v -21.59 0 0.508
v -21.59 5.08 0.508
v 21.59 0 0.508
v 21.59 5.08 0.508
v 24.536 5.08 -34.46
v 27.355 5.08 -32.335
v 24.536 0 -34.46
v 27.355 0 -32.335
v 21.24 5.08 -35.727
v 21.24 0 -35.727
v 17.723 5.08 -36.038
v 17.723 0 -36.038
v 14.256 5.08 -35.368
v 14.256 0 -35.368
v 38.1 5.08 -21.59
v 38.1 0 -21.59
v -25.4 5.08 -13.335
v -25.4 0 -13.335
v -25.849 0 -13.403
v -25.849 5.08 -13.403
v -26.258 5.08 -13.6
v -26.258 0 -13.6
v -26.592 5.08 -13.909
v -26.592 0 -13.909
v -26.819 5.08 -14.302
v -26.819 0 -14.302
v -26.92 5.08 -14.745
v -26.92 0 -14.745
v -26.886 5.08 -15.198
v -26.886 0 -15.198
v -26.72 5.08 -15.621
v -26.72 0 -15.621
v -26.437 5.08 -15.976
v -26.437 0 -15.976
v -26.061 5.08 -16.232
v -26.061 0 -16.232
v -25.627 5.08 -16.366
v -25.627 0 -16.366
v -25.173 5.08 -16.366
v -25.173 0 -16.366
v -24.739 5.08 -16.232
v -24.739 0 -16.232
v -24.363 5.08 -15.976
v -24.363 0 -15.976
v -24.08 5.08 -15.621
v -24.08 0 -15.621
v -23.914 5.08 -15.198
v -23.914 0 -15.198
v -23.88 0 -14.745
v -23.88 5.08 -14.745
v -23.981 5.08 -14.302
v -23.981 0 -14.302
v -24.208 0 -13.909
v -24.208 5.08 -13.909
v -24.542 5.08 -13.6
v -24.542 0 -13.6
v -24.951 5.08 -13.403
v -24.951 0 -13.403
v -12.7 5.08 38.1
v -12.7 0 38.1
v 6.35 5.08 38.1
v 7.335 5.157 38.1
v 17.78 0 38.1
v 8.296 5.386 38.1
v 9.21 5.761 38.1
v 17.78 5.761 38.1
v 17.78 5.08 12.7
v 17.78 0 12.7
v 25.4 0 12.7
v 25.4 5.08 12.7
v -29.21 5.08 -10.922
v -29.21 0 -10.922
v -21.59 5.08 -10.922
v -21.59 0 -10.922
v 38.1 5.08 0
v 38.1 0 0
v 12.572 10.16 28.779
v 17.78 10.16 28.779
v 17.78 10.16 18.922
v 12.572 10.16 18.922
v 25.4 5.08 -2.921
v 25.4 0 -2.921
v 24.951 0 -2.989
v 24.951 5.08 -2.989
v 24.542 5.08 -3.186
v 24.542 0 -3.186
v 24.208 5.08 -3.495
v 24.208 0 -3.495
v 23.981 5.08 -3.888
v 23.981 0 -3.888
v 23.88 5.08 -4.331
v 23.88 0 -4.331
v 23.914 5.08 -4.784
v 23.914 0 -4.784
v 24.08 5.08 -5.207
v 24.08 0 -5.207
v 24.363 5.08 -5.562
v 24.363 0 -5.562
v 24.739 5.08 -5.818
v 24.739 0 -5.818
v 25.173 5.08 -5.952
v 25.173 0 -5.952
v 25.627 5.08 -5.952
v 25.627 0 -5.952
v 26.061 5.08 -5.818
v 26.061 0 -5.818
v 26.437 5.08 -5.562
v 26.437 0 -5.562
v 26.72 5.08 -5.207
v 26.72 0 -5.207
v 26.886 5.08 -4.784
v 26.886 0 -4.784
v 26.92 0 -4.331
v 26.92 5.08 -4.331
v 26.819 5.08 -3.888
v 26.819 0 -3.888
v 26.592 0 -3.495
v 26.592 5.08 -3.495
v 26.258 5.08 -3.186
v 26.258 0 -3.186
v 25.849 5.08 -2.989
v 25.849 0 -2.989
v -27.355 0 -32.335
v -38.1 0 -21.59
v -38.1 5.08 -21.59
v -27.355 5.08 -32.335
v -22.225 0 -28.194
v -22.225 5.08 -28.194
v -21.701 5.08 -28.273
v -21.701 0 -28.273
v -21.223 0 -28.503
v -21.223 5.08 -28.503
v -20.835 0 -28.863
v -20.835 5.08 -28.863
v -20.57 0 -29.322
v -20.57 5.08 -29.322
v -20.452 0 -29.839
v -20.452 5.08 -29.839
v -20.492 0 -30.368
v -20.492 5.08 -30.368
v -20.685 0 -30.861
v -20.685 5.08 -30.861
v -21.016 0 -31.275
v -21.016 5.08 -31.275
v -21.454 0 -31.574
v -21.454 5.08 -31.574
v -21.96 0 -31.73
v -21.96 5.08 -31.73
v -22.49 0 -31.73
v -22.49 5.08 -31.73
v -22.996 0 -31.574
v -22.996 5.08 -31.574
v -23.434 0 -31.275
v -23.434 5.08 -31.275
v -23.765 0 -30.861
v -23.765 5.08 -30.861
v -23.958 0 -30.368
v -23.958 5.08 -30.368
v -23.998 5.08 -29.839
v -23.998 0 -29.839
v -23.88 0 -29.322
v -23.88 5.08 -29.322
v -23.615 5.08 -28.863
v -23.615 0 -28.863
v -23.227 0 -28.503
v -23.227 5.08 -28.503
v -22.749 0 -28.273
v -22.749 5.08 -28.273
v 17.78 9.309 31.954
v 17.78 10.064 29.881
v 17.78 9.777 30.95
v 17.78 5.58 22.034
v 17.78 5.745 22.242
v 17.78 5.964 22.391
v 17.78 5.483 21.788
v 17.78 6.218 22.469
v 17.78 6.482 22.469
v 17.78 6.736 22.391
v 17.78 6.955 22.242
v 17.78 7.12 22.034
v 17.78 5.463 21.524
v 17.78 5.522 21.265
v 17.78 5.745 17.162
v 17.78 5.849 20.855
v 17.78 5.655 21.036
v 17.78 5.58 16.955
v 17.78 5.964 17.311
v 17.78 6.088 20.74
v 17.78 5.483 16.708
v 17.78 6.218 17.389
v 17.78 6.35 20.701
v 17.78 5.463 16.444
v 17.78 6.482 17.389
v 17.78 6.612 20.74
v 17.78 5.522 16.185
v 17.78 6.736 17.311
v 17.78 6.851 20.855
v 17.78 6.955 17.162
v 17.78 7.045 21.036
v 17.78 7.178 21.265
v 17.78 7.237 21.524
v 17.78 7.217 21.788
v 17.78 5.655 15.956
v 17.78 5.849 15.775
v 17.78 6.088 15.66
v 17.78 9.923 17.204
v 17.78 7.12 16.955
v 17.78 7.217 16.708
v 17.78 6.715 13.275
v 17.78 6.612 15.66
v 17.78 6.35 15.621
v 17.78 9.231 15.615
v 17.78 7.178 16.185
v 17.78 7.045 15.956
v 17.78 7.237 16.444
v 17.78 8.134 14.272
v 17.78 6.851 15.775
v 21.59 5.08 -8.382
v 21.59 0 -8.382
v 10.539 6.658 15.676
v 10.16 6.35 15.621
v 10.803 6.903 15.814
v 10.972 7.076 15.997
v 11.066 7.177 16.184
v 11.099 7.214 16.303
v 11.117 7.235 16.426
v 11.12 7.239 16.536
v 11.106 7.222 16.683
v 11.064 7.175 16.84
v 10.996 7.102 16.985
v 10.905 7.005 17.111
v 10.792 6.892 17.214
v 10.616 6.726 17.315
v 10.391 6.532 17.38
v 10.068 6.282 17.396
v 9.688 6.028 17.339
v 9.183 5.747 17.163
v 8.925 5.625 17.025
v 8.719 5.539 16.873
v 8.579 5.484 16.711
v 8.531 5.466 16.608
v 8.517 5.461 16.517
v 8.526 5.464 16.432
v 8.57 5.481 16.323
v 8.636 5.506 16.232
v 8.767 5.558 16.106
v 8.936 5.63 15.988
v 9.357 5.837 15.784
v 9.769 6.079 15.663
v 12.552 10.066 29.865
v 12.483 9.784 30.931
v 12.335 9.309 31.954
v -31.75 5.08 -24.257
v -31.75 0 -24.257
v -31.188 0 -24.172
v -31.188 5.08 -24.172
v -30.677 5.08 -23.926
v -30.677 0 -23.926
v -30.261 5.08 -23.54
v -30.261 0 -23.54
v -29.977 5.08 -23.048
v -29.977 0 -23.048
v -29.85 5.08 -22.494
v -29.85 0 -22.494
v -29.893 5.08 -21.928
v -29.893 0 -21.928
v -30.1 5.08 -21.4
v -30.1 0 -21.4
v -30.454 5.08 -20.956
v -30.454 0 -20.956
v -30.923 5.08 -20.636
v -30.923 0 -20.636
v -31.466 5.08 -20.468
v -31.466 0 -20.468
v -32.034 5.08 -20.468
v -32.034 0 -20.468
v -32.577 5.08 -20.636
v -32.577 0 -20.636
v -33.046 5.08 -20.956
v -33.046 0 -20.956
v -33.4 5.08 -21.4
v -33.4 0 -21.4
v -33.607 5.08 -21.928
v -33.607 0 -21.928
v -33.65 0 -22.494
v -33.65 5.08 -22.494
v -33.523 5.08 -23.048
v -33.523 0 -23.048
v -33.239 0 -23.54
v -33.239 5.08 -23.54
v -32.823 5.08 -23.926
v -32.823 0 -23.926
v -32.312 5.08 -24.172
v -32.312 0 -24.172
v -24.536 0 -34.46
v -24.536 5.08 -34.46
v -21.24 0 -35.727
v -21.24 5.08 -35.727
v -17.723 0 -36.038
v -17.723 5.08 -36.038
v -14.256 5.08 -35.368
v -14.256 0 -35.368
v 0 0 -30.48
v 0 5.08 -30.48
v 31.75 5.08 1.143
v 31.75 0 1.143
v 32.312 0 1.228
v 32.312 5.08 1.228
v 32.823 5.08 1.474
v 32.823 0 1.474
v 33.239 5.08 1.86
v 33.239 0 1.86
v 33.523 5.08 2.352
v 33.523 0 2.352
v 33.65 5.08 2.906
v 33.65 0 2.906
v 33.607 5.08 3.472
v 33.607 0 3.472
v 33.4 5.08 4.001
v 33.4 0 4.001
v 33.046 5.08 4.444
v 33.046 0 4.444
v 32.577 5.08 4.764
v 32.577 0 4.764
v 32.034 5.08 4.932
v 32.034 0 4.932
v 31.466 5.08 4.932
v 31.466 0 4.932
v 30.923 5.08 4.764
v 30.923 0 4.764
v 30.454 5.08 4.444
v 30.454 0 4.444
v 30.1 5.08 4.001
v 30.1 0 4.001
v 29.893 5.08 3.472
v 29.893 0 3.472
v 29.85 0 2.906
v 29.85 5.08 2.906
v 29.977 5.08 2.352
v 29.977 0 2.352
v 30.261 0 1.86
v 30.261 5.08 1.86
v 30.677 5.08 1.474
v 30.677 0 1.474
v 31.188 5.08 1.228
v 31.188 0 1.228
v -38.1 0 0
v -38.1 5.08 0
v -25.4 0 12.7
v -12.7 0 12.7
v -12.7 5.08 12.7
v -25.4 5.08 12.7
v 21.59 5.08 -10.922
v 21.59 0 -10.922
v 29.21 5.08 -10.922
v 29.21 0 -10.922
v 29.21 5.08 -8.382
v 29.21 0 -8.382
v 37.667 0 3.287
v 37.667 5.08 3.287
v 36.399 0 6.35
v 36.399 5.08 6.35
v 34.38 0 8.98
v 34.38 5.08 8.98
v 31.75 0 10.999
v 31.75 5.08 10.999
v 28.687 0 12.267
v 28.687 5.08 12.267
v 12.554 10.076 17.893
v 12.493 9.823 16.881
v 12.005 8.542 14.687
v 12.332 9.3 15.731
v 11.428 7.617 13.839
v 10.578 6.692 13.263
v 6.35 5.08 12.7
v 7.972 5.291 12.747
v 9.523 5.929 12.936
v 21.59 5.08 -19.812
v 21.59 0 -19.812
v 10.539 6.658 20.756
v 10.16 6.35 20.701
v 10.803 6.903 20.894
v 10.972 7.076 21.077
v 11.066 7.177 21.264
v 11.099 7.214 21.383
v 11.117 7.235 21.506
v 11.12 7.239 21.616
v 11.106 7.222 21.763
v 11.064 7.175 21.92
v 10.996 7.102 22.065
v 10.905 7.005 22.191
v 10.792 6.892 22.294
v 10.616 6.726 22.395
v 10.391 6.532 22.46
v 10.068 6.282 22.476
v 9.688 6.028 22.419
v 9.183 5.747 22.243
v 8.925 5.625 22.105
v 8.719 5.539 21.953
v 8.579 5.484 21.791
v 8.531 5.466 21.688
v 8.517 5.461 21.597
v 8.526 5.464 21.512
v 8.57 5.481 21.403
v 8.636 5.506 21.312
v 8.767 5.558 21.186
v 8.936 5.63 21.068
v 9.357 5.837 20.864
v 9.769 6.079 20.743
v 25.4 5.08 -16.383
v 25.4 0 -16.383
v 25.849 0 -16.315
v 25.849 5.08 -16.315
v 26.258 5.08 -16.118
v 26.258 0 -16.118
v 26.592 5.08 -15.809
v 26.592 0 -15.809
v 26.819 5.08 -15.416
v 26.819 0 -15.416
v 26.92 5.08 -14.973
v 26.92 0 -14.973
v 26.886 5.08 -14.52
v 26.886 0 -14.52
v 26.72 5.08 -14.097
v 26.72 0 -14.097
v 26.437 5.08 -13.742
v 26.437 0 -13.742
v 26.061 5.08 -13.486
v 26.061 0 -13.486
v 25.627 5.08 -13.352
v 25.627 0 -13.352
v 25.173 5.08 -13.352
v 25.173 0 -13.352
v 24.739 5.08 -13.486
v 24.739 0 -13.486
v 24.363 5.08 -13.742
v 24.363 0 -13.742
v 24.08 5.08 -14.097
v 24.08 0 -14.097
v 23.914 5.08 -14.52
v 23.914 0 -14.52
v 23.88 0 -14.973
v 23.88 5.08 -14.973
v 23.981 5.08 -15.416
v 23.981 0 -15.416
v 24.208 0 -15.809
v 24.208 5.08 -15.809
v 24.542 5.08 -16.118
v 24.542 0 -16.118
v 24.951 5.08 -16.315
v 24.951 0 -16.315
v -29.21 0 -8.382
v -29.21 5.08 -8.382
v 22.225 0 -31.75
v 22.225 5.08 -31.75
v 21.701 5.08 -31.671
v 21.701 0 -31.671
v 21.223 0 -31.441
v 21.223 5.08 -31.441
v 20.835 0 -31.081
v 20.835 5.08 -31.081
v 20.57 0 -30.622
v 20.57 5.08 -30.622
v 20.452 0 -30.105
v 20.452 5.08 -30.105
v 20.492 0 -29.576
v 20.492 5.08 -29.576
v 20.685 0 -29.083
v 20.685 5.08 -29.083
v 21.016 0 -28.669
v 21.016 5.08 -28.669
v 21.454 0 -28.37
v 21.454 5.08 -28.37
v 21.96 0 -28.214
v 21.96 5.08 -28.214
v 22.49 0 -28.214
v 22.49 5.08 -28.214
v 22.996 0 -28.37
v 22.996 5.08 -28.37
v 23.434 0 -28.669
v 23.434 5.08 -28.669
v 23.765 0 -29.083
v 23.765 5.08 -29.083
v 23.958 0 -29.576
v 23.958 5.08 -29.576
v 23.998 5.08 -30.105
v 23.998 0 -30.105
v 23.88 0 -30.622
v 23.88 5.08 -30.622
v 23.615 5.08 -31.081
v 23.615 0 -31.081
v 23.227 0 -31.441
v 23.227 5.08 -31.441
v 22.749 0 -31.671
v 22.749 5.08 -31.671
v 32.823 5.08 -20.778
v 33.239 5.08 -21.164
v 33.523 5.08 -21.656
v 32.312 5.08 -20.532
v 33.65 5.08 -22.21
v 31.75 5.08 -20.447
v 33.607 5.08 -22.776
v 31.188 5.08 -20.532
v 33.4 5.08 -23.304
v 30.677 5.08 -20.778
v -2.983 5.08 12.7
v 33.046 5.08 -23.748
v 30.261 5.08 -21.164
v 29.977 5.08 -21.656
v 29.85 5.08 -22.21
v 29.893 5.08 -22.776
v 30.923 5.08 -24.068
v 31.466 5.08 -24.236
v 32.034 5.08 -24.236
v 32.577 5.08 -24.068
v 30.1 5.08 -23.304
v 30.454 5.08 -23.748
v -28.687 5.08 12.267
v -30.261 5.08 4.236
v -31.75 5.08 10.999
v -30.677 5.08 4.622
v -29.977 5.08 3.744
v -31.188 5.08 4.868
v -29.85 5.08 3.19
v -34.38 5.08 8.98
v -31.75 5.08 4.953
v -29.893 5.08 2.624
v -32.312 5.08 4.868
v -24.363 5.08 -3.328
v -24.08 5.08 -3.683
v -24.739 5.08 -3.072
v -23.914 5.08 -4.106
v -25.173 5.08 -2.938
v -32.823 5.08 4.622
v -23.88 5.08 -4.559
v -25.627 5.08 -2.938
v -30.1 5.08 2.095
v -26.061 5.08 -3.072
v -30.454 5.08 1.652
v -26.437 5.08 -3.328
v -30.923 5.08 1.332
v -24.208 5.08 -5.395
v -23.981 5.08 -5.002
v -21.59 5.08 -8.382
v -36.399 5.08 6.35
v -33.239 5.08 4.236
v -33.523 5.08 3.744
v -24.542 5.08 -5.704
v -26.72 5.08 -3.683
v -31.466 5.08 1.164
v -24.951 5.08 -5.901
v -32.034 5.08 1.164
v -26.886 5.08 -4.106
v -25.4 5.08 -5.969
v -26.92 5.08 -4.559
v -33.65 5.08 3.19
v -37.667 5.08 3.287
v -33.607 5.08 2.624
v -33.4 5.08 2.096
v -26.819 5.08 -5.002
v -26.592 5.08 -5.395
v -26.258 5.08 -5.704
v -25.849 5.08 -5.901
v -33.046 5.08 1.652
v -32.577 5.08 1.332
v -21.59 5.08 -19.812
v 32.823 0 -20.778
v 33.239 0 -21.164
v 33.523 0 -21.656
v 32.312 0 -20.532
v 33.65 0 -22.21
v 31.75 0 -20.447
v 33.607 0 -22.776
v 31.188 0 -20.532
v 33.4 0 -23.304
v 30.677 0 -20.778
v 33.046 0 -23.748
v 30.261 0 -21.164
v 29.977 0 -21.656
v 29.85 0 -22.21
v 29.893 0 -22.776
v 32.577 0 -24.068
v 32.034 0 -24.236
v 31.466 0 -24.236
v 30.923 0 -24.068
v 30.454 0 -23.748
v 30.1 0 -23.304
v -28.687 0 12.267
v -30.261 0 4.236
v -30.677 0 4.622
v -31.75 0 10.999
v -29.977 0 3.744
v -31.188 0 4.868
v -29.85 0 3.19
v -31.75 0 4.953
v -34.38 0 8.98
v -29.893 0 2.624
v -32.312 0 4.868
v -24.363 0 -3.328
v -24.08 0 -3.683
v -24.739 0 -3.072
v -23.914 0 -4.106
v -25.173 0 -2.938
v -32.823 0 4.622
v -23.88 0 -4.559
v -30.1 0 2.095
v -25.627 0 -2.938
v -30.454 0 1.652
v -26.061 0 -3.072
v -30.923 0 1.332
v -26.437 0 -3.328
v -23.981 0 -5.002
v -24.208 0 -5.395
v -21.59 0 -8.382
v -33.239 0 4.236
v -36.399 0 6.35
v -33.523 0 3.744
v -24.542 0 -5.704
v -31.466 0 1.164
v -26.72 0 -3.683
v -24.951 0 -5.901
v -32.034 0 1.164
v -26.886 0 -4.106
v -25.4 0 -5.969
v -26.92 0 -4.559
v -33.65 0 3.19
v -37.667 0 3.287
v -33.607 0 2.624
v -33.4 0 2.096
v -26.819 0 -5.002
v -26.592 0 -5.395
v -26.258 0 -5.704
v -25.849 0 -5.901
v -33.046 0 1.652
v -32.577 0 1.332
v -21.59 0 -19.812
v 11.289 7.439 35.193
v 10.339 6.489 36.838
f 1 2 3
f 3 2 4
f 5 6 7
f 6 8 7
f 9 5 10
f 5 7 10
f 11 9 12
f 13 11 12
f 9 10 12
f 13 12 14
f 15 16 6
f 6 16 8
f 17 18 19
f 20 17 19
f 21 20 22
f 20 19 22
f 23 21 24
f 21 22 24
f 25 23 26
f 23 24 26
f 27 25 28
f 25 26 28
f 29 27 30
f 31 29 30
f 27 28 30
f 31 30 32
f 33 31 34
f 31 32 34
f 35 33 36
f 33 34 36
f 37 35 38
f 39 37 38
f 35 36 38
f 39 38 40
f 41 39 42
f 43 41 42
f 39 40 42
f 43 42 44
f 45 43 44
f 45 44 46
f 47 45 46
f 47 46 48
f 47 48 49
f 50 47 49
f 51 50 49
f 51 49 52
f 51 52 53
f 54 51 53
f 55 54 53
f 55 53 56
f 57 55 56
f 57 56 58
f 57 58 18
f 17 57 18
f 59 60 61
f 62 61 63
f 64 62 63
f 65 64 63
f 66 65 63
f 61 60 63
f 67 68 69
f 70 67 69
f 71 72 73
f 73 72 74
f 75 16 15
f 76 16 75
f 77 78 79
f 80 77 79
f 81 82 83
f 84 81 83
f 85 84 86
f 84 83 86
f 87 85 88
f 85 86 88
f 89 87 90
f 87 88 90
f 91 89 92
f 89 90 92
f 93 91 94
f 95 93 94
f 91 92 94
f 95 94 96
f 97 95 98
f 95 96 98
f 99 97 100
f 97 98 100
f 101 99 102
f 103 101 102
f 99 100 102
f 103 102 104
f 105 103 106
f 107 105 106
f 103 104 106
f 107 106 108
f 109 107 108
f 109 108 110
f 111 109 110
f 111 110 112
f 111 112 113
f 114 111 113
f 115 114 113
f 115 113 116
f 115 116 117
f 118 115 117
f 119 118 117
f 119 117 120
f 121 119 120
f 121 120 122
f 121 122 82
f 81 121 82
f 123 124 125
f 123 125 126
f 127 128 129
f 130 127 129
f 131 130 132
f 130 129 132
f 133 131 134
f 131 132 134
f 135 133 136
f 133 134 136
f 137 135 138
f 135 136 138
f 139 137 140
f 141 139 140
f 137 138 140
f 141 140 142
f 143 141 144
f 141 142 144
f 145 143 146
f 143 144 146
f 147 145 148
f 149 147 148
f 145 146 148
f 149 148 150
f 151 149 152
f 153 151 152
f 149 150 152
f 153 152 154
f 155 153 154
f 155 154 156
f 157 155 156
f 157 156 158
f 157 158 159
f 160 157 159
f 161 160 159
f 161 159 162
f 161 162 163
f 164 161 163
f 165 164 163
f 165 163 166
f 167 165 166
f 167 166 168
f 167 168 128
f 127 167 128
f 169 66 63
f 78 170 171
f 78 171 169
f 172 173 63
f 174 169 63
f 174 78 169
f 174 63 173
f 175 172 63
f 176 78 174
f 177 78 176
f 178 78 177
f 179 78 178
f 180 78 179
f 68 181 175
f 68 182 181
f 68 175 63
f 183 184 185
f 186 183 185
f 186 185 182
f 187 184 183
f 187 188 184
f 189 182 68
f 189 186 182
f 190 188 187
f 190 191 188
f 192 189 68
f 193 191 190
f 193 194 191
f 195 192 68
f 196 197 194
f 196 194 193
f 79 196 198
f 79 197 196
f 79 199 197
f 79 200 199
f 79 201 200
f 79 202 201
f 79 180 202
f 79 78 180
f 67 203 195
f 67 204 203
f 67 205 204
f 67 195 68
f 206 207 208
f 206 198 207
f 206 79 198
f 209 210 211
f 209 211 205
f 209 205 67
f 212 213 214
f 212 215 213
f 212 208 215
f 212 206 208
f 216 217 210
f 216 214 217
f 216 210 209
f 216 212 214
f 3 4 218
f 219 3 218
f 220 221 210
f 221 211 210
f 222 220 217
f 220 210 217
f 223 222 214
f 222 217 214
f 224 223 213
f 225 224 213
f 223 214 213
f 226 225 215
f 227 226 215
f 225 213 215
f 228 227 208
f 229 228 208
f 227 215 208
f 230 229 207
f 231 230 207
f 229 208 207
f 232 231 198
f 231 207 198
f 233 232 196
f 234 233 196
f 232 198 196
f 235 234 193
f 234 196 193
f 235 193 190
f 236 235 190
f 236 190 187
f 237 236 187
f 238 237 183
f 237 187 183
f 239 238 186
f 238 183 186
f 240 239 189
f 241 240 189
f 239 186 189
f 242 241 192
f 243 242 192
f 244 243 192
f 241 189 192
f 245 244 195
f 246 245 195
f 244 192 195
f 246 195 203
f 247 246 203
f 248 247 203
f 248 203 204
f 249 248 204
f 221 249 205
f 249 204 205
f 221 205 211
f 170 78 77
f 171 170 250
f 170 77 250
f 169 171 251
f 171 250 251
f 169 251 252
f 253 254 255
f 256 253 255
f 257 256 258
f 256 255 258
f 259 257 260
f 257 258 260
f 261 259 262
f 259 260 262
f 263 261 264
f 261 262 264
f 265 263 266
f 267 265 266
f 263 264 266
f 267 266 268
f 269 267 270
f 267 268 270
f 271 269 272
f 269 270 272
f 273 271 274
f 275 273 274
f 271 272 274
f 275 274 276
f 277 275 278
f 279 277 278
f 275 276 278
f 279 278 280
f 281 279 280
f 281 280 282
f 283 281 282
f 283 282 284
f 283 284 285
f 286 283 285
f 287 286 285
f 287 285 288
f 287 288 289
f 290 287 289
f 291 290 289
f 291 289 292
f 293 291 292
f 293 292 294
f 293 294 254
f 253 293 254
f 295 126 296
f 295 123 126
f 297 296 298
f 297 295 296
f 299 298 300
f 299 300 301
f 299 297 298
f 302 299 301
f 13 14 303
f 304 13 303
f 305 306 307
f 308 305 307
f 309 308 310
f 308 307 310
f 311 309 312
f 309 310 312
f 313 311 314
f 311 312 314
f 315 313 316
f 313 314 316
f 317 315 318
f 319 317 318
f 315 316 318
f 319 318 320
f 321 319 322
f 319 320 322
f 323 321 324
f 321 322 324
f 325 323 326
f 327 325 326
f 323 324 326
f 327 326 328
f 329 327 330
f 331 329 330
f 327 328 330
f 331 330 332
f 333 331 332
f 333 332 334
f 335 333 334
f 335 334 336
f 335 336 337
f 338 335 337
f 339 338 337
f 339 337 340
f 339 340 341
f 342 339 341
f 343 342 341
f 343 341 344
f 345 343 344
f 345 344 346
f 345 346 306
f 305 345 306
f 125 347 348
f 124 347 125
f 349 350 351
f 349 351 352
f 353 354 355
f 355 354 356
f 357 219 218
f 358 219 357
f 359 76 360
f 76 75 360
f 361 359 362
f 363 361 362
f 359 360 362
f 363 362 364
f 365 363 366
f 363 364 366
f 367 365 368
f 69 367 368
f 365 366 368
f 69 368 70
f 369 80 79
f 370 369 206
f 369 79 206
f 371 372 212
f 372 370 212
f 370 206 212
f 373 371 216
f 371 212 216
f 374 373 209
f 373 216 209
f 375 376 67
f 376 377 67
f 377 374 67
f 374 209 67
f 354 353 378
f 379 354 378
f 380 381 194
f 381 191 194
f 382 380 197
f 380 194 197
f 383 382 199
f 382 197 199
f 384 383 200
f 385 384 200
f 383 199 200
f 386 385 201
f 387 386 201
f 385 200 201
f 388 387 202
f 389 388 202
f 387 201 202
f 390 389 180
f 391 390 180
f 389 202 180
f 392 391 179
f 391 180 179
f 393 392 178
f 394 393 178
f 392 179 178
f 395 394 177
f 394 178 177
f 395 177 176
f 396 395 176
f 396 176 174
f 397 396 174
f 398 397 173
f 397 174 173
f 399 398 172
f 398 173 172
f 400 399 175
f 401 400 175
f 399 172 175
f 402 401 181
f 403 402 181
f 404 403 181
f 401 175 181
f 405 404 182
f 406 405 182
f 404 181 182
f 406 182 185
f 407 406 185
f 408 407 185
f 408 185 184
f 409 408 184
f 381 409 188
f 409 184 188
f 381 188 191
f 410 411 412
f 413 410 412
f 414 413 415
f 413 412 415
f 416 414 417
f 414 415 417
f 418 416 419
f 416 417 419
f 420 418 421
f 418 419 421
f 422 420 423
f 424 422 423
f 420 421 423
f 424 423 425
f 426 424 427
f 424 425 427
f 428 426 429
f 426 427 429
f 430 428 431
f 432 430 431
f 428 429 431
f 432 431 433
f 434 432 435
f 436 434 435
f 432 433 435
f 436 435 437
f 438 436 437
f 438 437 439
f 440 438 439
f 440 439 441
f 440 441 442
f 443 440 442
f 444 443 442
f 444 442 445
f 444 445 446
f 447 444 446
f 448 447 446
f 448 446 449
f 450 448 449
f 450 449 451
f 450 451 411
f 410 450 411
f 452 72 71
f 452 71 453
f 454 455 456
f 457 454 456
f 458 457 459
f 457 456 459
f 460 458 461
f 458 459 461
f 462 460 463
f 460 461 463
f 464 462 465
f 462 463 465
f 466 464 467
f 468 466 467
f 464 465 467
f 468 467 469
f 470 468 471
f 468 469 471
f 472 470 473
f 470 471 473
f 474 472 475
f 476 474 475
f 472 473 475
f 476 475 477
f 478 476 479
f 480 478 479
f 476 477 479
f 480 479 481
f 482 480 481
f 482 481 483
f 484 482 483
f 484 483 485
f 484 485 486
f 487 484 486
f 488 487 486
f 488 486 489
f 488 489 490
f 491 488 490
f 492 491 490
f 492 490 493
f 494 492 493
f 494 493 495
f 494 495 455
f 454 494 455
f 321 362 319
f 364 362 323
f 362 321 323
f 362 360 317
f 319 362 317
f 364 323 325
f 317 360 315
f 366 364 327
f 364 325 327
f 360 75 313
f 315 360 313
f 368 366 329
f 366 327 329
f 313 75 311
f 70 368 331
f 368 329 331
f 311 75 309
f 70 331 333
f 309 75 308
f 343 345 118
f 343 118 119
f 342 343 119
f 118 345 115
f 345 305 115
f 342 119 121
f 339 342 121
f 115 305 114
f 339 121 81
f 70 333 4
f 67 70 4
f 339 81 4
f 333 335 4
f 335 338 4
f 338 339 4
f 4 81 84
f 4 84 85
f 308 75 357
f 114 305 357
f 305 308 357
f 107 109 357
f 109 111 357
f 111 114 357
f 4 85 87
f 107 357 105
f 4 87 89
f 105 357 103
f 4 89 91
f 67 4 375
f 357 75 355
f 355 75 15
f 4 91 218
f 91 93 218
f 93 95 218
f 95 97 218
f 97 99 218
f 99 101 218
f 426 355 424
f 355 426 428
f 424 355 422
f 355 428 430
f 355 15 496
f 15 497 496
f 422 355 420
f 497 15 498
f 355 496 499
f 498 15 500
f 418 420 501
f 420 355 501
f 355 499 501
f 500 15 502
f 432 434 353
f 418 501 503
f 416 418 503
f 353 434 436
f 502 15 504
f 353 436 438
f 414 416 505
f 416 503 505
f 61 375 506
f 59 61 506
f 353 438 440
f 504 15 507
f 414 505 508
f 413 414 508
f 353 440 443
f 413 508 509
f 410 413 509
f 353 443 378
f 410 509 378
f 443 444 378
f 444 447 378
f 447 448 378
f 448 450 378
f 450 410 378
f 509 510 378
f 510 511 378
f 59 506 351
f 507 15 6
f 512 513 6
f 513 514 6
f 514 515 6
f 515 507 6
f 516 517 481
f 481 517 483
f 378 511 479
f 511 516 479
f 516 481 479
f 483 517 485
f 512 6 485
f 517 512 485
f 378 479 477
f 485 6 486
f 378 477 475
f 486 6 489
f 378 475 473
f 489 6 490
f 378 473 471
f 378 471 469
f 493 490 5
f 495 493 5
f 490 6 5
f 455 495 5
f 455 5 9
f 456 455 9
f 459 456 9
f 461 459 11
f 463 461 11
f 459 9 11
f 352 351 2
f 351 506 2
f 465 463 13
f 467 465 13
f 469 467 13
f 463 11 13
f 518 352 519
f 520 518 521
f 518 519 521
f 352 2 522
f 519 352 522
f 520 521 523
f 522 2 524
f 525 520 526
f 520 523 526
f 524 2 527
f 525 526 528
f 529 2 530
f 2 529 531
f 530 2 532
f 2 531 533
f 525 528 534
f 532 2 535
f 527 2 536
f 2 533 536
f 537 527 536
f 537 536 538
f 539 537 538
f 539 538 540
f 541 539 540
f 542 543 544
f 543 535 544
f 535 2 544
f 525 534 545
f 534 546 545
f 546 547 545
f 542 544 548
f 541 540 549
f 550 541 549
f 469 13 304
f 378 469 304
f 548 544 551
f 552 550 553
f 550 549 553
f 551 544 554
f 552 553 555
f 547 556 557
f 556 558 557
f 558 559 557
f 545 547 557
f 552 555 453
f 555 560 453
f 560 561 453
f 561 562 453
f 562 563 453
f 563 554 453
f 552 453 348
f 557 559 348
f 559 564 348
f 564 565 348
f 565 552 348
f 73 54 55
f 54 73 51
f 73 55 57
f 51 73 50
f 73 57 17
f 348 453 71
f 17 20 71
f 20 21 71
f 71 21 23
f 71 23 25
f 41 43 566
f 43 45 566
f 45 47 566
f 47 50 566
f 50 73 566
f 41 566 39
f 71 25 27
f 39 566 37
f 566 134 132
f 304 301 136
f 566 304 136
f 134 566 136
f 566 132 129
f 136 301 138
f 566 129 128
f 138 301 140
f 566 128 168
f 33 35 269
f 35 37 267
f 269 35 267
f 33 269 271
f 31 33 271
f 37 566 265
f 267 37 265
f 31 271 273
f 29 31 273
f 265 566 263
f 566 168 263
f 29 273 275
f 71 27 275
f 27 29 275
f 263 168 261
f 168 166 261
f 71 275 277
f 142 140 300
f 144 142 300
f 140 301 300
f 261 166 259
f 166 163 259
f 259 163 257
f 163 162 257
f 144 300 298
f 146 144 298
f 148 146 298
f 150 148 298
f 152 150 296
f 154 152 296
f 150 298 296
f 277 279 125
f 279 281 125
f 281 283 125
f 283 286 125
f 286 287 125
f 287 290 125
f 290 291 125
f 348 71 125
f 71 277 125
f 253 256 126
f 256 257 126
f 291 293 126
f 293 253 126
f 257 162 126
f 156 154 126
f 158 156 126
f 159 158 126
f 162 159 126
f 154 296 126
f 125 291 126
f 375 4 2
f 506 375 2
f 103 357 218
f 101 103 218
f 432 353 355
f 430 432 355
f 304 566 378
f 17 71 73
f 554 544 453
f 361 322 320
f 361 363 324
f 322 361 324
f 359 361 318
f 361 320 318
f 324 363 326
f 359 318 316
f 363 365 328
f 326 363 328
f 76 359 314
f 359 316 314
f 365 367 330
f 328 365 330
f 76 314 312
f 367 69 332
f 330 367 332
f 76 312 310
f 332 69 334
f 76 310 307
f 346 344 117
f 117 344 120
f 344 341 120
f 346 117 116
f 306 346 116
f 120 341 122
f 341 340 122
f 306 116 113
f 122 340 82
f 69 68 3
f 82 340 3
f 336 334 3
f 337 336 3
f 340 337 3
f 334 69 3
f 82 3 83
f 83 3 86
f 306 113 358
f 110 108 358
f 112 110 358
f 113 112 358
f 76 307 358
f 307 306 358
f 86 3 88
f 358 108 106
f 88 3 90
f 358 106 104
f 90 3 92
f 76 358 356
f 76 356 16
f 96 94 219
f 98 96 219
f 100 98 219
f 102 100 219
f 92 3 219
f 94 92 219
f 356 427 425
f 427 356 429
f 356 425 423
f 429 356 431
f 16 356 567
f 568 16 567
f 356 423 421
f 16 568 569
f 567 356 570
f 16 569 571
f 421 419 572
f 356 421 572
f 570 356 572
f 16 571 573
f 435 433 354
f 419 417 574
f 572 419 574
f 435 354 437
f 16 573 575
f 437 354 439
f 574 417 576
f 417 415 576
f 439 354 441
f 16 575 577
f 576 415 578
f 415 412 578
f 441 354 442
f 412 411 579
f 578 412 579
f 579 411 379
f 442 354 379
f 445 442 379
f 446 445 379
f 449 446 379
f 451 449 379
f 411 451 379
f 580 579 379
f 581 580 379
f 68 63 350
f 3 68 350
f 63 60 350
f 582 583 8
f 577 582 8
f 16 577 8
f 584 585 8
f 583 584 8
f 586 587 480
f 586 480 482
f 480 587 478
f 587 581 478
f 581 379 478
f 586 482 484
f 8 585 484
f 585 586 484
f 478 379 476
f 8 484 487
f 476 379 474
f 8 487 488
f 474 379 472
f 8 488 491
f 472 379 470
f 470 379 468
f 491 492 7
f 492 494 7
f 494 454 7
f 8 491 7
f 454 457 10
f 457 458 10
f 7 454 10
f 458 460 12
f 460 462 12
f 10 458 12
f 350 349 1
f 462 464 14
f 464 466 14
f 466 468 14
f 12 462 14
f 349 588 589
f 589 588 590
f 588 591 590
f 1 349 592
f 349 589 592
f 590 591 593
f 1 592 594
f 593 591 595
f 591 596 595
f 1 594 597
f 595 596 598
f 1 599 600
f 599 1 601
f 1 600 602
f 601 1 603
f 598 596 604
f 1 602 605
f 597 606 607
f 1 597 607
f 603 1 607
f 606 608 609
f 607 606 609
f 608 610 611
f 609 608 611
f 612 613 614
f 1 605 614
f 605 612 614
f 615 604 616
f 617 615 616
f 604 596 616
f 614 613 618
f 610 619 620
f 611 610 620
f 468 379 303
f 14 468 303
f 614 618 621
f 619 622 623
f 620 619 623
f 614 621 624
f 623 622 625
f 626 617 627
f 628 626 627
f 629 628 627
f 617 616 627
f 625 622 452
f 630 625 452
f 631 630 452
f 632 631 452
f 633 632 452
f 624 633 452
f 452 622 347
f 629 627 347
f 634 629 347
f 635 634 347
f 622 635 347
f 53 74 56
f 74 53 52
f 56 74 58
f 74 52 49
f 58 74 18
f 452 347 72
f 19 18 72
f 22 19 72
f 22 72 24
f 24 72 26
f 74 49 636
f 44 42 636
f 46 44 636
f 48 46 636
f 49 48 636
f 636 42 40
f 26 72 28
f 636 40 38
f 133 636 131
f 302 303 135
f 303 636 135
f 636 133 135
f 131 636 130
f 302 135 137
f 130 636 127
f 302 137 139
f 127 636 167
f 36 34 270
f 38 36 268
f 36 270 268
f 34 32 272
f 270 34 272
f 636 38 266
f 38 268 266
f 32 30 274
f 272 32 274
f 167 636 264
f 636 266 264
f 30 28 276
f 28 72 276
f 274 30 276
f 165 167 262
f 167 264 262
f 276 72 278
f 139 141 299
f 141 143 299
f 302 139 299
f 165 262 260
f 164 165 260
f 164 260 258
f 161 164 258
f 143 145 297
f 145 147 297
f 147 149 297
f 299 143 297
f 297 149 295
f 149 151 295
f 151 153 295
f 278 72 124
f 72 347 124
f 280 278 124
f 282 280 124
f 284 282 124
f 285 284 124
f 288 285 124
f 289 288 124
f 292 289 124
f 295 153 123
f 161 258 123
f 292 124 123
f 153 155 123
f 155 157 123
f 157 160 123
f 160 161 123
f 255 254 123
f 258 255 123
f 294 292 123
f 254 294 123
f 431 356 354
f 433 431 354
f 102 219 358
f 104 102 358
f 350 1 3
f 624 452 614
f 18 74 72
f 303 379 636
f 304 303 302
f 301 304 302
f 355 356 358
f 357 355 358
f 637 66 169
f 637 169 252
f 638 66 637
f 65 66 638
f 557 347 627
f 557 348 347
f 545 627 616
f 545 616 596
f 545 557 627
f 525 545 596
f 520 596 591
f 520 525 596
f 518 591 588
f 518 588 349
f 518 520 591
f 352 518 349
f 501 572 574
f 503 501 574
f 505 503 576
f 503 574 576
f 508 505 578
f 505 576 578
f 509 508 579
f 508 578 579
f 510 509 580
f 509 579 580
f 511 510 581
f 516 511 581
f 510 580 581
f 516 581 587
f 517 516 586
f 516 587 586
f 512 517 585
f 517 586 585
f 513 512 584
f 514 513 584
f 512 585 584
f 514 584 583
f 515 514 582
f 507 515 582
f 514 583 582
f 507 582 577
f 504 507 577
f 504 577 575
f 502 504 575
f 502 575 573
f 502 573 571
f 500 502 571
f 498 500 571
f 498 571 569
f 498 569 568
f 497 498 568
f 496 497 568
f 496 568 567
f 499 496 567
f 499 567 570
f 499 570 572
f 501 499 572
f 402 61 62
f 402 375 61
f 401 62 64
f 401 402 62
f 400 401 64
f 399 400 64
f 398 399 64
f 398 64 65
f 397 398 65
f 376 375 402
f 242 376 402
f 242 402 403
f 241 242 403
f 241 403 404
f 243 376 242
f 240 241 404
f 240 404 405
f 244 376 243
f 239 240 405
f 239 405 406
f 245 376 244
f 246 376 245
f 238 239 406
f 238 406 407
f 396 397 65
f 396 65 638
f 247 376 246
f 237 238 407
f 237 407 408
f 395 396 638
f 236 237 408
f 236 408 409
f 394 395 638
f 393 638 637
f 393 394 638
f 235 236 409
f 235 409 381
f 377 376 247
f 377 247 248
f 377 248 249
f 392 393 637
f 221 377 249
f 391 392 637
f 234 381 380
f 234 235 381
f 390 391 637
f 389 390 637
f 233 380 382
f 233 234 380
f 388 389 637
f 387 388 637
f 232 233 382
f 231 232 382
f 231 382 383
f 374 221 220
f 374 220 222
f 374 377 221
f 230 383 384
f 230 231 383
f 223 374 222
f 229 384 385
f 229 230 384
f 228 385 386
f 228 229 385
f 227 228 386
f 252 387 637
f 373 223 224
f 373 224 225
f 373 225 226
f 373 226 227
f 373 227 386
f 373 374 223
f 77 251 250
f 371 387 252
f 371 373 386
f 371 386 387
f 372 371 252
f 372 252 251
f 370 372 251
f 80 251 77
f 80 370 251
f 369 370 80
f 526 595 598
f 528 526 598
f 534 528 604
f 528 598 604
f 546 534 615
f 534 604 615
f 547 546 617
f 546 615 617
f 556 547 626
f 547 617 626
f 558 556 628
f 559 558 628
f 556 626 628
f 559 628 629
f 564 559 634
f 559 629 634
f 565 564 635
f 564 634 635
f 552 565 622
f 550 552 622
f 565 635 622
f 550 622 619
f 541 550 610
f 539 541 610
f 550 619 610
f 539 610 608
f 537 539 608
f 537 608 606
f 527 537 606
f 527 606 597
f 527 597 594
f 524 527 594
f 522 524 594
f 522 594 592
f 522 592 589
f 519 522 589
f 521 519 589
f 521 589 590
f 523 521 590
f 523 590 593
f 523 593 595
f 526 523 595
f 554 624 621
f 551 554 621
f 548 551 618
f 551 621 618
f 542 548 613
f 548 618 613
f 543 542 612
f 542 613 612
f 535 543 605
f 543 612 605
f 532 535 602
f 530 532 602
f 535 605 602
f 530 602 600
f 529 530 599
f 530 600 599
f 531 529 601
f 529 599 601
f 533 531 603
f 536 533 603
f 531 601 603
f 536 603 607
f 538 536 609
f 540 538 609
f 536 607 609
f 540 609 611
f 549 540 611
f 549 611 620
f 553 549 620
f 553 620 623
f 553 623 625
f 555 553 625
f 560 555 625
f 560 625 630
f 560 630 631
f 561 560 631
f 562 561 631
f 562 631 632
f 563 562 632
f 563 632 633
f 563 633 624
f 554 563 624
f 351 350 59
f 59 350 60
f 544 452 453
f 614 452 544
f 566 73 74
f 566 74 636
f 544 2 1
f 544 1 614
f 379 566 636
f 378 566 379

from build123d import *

# Parameters (mm, degrees)
BOSS_EXTRUDE1_DEPTH = 5.08
SKETCH2_R           = 1.778
CUT_EXTRUDE1_DEPTH  = 55.120480412
SKETCH3_W           = 43.18
SKETCH3_H           = 20.32
CUT_EXTRUDE2_DEPTH  = 55.120480412
SKETCH10_R          = 1.524
CUT_EXTRUDE3_DEPTH  = 55.120480412
SKETCH11_W          = 7.62
SKETCH11_H          = 2.54
CUT_EXTRUDE4_DEPTH  = 55.120480412
CUT_EXTRUDE5_DEPTH  = 55.120480412
SKETCH14_R          = 1.905
CUT_EXTRUDE6_DEPTH  = 55.120480412
CHAMFER1_SIZE       = 16.51
CHAMFER3_SIZE       = 16.51
FILLET1_R           = 12.7
FILLET2_R           = 12.7
SKETCH15_W          = 6.35
SKETCH15_H          = 25.4
CUT_EXTRUDE7_DEPTH  = 55.120480412
SKETCH18_W          = 25.4
SKETCH18_H          = 12.7
BOSS_EXTRUDE3_DEPTH = 5.08
SKETCH19_R          = 0.889
CUT_EXTRUDE9_DEPTH  = 69.814783295
FILLET4_R           = 6.35
SKETCH20_W          = 25.4
SKETCH20_H          = 2.54
CUT_EXTRUDE10_DEPTH = 69.814783351
CHAMFER4_SIZE       = 7.62
CHAMFER4_SIZE2      = 4.399409051
FILLET5_R           = 6.35
FILLET6_R           = 6.35


with BuildPart() as part:
    # Sketch1 → Boss-Extrude1 (new body)
    with BuildSketch(Plane(origin=(0, 0, 0), x_dir=(1, 0, 0), z_dir=(0, 1, 0))):
        Polygon((-38.1, -12.7), (-38.1, 38.1), (38.1, 38.1), (38.1, -12.7), (19.05, -12.7), (19.05, -38.1), (-19.05, -38.1), (-19.05, -12.7), align=None)
    extrude(amount=BOSS_EXTRUDE1_DEPTH)

    # Sketch2 → Cut-Extrude1 (cut, through all)
    with BuildSketch(Plane(origin=(0, 5.08, 0), x_dir=(1, 0, 0), z_dir=(0, 1, 0))):
        with Locations(Location((-22.225, 29.972, 0), (0, 0, 270))):
            Circle(SKETCH2_R)
        with Locations(Location((22.225, 29.972, 0), (0, 0, 90))):
            Circle(SKETCH2_R)
    extrude(amount=-CUT_EXTRUDE1_DEPTH, mode=Mode.SUBTRACT)

    # Sketch3 → Cut-Extrude2 (cut, through all)
    with BuildSketch(Plane(origin=(0, 5.08, 0), x_dir=(1, 0, 0), z_dir=(0, 1, 0))):
        with Locations((0, 9.652)):
            Rectangle(SKETCH3_W, SKETCH3_H)
    extrude(amount=-CUT_EXTRUDE2_DEPTH, mode=Mode.SUBTRACT)

    # Sketch10 → Cut-Extrude3 (cut, through all)
    with BuildSketch(Plane.XZ):
        with Locations(Location((25.4, -14.859, 0), (0, 0, 270))):
            Circle(SKETCH10_R)
        with Locations(Location((25.4, -4.445, 0), (0, 0, 90))):
            Circle(SKETCH10_R)
        with Locations(Location((-25.4, -14.859, 0), (0, 0, 90))):
            Circle(SKETCH10_R)
        with Locations(Location((-25.4, -4.445, 0), (0, 0, 270))):
            Circle(SKETCH10_R)
    extrude(amount=-CUT_EXTRUDE3_DEPTH, mode=Mode.SUBTRACT)

    # Sketch11 → Cut-Extrude4 (cut, through all)
    with BuildSketch(Plane.XZ):
        with Locations((25.4, -9.652)):
            Rectangle(SKETCH11_W, SKETCH11_H)
        with Locations((-25.4, -9.652)):
            Rectangle(SKETCH11_W, SKETCH11_H)
    extrude(amount=-CUT_EXTRUDE4_DEPTH, mode=Mode.SUBTRACT)

    # Sketch12 → Cut-Extrude5 (cut, through all)
    with BuildSketch(Plane.XZ):
        Polygon((22.225, -38.1), (0, -30.48), (-22.225, -38.1), align=None)
    extrude(amount=-CUT_EXTRUDE5_DEPTH, mode=Mode.SUBTRACT)

    # Sketch14 → Cut-Extrude6 (cut, through all)
    with BuildSketch(Plane.XZ):
        with Locations(Location((31.75, 3.048, 0), (0, 0, 270))):
            Circle(SKETCH14_R)
        with Locations(Location((31.75, -22.352, 0), (0, 0, 90))):
            Circle(SKETCH14_R)
        with Locations(Location((-31.75, 3.048, 0), (0, 0, 90))):
            Circle(SKETCH14_R)
        with Locations(Location((-31.75, -22.352, 0), (0, 0, 270))):
            Circle(SKETCH14_R)
    extrude(amount=-CUT_EXTRUDE6_DEPTH, mode=Mode.SUBTRACT)

    # Chamfer1
    # the kernel refuses this chamfer: 16.51 mm, written as the material it takes off along each edge
    with BuildSketch(Plane(origin=(38.1, -42.458486131, -38.1), x_dir=(0.027495876610586233, 0, 0.9996219169112966), z_dir=(0, 1, 0))) as chamfer1_piece_1:
        Polygon((CHAMFER1_SIZE * 0.999621916911, -CHAMFER1_SIZE * 0.0274958766106), (-CHAMFER1_SIZE * 0.0274958766106, -CHAMFER1_SIZE * 0.999621916911), (0, 0), align=None)
    extrude(amount=89.996972263, mode=Mode.SUBTRACT)

    # Chamfer3
    # the kernel refuses this chamfer: 16.51 mm, written as the material it takes off along each edge
    with BuildSketch(Plane(origin=(-38.1, -42.458486131, -38.1), x_dir=(-0.02749587661058624, 0, 0.9996219169112966), z_dir=(0, 1, 0))) as chamfer3_piece_1:
        Polygon((CHAMFER3_SIZE * 0.999621916911, CHAMFER3_SIZE * 0.0274958766106), (-CHAMFER3_SIZE * 0.0274958766106, CHAMFER3_SIZE * 0.999621916911), (0, 0), align=None)
    extrude(amount=89.996972263, mode=Mode.SUBTRACT)

    # Fillet1
    fillet1_edges = [part.edges().sort_by_distance(p)[0] for p in [
        (21.75212766, 2.54, -37.93787234),
        (-21.75212766, 2.54, -37.93787234),
    ]]
    fillet(fillet1_edges, radius=FILLET1_R)

    # Fillet2
    fillet2_edges = [part.edges().sort_by_distance(p)[0] for p in [
        (38.1, 2.54, 12.7),
        (-38.1, 2.54, 12.7),
    ]]
    fillet(fillet2_edges, radius=FILLET2_R)

    # Sketch15 → Cut-Extrude7 (cut, through all)
    with BuildSketch(Plane.XZ):
        with Locations((15.875, 25.4)):
            Rectangle(SKETCH15_W, SKETCH15_H)
        with Locations((-15.875, 25.4)):
            Rectangle(SKETCH15_W, SKETCH15_H)
    extrude(amount=-CUT_EXTRUDE7_DEPTH, mode=Mode.SUBTRACT)

    # Sketch18 → Boss-Extrude3 (add)
    with BuildSketch(Plane(origin=(12.7, 0, 0), x_dir=(0, 0, -1), z_dir=(1, 0, 0))):
        with Locations((-25.4, 6.35)):
            Rectangle(SKETCH18_W, SKETCH18_H)
    extrude(amount=BOSS_EXTRUDE3_DEPTH)

    # Sketch19 → Cut-Extrude9 (cut, through all)
    with BuildSketch(Plane(origin=(17.78, 0, 0), x_dir=(0, 0, -1), z_dir=(1, 0, 0))):
        with Locations((-16.51, 6.35)):
            Circle(SKETCH19_R)
        with Locations((-21.59, 6.35)):
            Circle(SKETCH19_R)
    extrude(amount=-CUT_EXTRUDE9_DEPTH, mode=Mode.SUBTRACT)

    # Fillet4
    # the kernel refuses this fillet: 6.35 mm, written as the material it adds along each edge
    with BuildSketch(Plane(origin=(12.7, 5.08, 12.7), x_dir=(-1, 0, 0), z_dir=(0, 0, 1))) as fillet4_piece_1_section:
        with BuildLine():
            CenterArc((FILLET4_R, -FILLET4_R), FILLET4_R, 90, 90)
            Line((0, -FILLET4_R), (0, 0))
            Line((0, 0), (FILLET4_R, 0))
        make_face()
    fillet4_piece_1 = extrude(amount=25.4, mode=Mode.PRIVATE)
    fillet4_piece_1 = fillet4_piece_1 - Plane(origin=(11.255700074, 6.35, 16.51), x_dir=(0, 0, -1), z_dir=(1, 0, 0)) * Cylinder(0.889, 77, mode=Mode.PRIVATE)
    fillet4_piece_1 = fillet4_piece_1 - Plane(origin=(11.255700074, 6.35, 21.59), x_dir=(0, 0, -1), z_dir=(1, 0, 0)) * Cylinder(0.889, 77, mode=Mode.PRIVATE)
    add(fillet4_piece_1)

    # Sketch20 → Cut-Extrude10 (cut, through all)
    with BuildSketch(Plane(origin=(17.78, 0, 0), x_dir=(0, 0, -1), z_dir=(1, 0, 0))):
        with Locations((-25.4, 11.43)):
            Rectangle(SKETCH20_W, SKETCH20_H)
    extrude(amount=-CUT_EXTRUDE10_DEPTH, mode=Mode.SUBTRACT)

    # Chamfer4
    chamfer4_edges = [part.edges().sort_by_distance(p)[0] for p in [
        (15.175851973, 10.16, 38.1),
    ]]
    chamfer4_side = [part.faces().sort_by_distance(p)[0] for p in [
        (15.175851973, 10.16, 25.4),
    ]]
    chamfer(chamfer4_edges, length=CHAMFER4_SIZE, length2=CHAMFER4_SIZE2, reference=chamfer4_side[0])

    # Fillet5
    fillet5_edges = [part.edges().sort_by_distance(p)[0] for p in [
        (15.175851973, 10.16, 30.48),
    ]]
    fillet(fillet5_edges, radius=FILLET5_R)

    # Fillet6
    # the kernel refuses this fillet: 6.35 mm, written as the material it takes off along each edge
    with BuildSketch(Plane(origin=(33.334259867, 10.16, 12.7), x_dir=(0, 0, 1), z_dir=(-1, 0, 0))) as fillet6_piece_1:
        with BuildLine():
            CenterArc((6.221703947, -6.35), FILLET6_R, 90, 78.463040967)
            Line((0, -5.08), (-0.124434079, -5.0546))
            ThreePointArc((-0.124434079, -5.0546), (-0.127, -2.54), (-0.127, 0))
            Line((-0.127, 0), (0, 0.127))
            Line((0, 0.127), (6.221703947, 0.127))
            Line((6.221703947, 0.127), (6.221703947, 0))
        make_face()
    extrude(amount=36.316815787, mode=Mode.SUBTRACT)


solid = part.part
